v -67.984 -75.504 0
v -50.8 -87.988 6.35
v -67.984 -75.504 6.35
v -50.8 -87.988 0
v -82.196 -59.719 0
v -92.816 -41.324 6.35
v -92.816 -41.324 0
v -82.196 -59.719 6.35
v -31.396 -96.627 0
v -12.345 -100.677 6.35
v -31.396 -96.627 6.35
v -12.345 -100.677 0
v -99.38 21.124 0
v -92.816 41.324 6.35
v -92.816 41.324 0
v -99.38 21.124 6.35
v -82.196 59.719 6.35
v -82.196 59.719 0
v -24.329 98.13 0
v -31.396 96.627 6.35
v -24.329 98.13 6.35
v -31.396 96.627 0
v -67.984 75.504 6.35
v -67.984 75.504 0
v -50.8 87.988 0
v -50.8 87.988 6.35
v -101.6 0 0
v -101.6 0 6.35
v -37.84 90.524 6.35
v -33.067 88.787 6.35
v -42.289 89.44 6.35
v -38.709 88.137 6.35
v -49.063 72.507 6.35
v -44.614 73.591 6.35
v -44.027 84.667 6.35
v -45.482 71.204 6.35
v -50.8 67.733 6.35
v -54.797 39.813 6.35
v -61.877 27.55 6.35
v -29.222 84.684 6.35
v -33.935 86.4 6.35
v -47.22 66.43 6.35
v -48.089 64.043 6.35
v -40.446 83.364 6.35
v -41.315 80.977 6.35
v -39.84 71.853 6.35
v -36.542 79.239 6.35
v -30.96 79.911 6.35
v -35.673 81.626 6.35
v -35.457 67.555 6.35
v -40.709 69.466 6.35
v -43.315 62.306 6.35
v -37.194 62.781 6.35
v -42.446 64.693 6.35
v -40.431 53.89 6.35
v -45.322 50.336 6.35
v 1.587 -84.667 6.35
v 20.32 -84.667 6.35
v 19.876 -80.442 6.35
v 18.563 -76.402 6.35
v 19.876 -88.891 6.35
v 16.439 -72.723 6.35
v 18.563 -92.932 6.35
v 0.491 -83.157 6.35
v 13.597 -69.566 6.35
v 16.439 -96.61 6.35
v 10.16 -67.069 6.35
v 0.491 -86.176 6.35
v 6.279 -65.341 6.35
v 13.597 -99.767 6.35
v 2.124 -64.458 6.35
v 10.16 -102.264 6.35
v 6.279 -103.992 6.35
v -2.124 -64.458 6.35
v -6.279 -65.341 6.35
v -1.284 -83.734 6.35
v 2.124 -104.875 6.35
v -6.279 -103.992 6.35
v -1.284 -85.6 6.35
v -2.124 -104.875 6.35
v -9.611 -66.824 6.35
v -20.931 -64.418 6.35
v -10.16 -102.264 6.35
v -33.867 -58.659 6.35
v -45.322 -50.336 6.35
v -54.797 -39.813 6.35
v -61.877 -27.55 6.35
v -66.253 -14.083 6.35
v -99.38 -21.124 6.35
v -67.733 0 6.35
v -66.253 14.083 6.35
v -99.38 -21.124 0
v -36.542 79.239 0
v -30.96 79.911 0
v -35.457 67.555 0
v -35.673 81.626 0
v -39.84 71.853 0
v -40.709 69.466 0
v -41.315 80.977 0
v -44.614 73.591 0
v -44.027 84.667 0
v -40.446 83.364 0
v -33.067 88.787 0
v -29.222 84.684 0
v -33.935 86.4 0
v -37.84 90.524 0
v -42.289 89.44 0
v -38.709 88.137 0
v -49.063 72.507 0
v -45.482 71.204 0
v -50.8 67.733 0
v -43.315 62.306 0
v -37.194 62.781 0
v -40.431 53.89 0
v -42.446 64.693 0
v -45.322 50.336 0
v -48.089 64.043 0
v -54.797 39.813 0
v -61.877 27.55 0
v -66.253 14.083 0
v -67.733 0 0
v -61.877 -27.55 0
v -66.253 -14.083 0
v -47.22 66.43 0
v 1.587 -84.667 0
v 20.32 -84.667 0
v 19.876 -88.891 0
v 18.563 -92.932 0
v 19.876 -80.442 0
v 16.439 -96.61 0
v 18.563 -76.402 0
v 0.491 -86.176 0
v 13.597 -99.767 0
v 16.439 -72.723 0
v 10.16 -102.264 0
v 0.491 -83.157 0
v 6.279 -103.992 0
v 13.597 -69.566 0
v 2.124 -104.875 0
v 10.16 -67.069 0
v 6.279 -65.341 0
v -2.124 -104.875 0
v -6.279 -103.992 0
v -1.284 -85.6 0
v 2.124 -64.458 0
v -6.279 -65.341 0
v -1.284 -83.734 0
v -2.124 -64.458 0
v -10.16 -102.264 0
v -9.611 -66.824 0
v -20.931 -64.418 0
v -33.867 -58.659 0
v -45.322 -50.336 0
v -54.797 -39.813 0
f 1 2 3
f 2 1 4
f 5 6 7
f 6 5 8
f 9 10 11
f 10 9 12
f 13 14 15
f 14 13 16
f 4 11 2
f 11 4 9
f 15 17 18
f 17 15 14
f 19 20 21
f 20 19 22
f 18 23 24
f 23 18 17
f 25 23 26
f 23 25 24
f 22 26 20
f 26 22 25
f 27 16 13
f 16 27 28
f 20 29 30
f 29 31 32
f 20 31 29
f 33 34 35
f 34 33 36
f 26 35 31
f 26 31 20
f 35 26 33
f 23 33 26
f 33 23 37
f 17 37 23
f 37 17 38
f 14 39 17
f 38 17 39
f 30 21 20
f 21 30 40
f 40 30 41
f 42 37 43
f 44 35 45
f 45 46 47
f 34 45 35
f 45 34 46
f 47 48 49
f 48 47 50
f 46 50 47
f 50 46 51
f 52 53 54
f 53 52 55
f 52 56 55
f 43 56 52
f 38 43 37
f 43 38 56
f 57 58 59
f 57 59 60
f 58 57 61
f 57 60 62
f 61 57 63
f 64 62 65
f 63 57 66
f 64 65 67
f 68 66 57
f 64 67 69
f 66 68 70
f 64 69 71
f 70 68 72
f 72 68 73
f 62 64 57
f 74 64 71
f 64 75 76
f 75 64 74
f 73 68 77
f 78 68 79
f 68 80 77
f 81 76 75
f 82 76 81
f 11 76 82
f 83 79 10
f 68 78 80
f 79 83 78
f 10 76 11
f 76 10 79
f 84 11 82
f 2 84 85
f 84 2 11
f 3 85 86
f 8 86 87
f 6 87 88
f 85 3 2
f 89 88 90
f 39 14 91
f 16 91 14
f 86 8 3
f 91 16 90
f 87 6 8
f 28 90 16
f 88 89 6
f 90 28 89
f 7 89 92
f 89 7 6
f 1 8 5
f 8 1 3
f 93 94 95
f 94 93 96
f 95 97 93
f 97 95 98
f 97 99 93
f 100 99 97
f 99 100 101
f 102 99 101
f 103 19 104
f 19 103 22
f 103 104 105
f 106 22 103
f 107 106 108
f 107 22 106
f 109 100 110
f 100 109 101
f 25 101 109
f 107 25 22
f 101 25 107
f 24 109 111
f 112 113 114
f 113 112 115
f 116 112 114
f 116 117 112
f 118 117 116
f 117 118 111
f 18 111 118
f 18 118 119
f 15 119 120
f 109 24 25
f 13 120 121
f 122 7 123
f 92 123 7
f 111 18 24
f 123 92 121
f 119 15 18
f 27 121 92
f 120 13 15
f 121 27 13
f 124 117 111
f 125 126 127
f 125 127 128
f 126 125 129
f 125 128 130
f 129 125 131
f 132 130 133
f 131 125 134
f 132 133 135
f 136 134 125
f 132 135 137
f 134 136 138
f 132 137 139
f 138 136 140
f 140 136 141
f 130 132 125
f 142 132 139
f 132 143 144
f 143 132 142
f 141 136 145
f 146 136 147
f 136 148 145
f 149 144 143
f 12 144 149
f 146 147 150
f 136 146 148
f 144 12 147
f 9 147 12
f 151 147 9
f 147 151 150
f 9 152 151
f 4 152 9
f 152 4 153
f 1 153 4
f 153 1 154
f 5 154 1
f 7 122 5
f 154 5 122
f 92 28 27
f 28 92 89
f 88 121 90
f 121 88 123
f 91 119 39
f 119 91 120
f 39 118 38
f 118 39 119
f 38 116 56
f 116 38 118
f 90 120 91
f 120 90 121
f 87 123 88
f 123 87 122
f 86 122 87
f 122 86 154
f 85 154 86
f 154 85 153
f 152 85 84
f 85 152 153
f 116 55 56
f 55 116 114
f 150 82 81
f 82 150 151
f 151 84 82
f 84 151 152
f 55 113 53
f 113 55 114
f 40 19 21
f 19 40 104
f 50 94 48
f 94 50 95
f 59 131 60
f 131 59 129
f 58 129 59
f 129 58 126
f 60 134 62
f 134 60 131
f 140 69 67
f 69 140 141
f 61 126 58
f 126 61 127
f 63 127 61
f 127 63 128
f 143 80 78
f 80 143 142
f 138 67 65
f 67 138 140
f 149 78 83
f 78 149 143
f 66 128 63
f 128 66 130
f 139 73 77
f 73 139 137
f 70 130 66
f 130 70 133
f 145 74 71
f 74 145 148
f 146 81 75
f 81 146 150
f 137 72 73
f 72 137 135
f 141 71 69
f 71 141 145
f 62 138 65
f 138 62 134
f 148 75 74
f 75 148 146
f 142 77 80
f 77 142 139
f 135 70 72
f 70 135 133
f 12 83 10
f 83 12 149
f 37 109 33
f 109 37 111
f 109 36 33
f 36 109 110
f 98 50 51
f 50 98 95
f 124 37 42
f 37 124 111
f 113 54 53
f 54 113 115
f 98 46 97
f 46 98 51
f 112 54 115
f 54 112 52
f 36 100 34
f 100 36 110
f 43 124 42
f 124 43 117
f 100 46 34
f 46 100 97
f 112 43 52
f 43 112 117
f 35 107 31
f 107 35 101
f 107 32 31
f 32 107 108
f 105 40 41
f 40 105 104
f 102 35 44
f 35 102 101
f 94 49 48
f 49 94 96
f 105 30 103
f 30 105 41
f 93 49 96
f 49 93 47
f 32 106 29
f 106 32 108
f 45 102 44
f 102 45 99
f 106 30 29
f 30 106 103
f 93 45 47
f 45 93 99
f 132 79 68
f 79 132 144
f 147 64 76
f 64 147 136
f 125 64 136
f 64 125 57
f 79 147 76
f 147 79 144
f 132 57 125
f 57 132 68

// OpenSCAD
    function mm(i) = i*25.4; 
    thickness = mm(.25); 
    radius = mm(4); 
	 screwWidth = mm(.2);
	 screwDepth = mm(.6);
	 nutWidth = mm(.4);
	 nutDepth = mm(.2);
	 motorHole = mm(1/16);
    
    
module baseleg(thickness=mm(.25), radius=mm(4)) 
    { 
       union()
		{
			 difference() 
         { 
              cylinder(thickness, radius, radius, 0); 
    
              translate([0, 0, -1]) 
              { 
                   cylinder(thickness+2, radius*2/3, radius*2/3, 0); 
    
              } 
					translate([0, -radius, -1]) 
					{
						cube([radius, radius*2, thickness+2]);
         		}
					
					translate([-(radius/2), radius/4, -1]) 
					{
						rotate([0, 0, -20])
						{
							cube([radius, radius, thickness+2]);
						}
					}
         	}
		translate([0, -radius+(radius-radius*2/3)/2, 0]) 
		{			
			cylinder(thickness, radius*.2, radius*.2,0);
		}	

	}
 }   
    
module holes(screwWidth=mm(.2),screwDepth=mm(.6),nutWidth=mm(.4),nutDepth=mm(.2),motorHole=mm(1/16))
{
	translate([-radius/2,2*radius/3,-1])
		{
		rotate([0,0,-20])
			{
			union()
				{
					cube ([screwDepth, screwWidth, thickness+2]);
					translate([screwDepth/4, -(nutWidth-screwWidth)/2, 0])
						{
						cube ([nutDepth, nutWidth, thickness+2]); 
						}
				}
			}
		}
	translate([-radius/2+(radius-2*radius/3)/5,2*radius/3+(radius-2*radius/3)/2,-1])
		{
		rotate([0,0,-20])
			{
			union()
				{
					cube ([screwDepth, screwWidth, thickness+2]);
					translate([screwDepth/4, -(nutWidth-screwWidth)/2, 0])
						{
						cube ([nutDepth, nutWidth, thickness+2]); 
						}
				}
			}
		}
	translate([0,-radius+(radius-2*radius/3)/2,-1])
		{
			cylinder(thickness+2, motorHole, motorHole, 0);
		}
} 
    
    
module gripleg()
{
	difference()
		{
			baseleg();
			holes();
		}
}

   
gripleg();
